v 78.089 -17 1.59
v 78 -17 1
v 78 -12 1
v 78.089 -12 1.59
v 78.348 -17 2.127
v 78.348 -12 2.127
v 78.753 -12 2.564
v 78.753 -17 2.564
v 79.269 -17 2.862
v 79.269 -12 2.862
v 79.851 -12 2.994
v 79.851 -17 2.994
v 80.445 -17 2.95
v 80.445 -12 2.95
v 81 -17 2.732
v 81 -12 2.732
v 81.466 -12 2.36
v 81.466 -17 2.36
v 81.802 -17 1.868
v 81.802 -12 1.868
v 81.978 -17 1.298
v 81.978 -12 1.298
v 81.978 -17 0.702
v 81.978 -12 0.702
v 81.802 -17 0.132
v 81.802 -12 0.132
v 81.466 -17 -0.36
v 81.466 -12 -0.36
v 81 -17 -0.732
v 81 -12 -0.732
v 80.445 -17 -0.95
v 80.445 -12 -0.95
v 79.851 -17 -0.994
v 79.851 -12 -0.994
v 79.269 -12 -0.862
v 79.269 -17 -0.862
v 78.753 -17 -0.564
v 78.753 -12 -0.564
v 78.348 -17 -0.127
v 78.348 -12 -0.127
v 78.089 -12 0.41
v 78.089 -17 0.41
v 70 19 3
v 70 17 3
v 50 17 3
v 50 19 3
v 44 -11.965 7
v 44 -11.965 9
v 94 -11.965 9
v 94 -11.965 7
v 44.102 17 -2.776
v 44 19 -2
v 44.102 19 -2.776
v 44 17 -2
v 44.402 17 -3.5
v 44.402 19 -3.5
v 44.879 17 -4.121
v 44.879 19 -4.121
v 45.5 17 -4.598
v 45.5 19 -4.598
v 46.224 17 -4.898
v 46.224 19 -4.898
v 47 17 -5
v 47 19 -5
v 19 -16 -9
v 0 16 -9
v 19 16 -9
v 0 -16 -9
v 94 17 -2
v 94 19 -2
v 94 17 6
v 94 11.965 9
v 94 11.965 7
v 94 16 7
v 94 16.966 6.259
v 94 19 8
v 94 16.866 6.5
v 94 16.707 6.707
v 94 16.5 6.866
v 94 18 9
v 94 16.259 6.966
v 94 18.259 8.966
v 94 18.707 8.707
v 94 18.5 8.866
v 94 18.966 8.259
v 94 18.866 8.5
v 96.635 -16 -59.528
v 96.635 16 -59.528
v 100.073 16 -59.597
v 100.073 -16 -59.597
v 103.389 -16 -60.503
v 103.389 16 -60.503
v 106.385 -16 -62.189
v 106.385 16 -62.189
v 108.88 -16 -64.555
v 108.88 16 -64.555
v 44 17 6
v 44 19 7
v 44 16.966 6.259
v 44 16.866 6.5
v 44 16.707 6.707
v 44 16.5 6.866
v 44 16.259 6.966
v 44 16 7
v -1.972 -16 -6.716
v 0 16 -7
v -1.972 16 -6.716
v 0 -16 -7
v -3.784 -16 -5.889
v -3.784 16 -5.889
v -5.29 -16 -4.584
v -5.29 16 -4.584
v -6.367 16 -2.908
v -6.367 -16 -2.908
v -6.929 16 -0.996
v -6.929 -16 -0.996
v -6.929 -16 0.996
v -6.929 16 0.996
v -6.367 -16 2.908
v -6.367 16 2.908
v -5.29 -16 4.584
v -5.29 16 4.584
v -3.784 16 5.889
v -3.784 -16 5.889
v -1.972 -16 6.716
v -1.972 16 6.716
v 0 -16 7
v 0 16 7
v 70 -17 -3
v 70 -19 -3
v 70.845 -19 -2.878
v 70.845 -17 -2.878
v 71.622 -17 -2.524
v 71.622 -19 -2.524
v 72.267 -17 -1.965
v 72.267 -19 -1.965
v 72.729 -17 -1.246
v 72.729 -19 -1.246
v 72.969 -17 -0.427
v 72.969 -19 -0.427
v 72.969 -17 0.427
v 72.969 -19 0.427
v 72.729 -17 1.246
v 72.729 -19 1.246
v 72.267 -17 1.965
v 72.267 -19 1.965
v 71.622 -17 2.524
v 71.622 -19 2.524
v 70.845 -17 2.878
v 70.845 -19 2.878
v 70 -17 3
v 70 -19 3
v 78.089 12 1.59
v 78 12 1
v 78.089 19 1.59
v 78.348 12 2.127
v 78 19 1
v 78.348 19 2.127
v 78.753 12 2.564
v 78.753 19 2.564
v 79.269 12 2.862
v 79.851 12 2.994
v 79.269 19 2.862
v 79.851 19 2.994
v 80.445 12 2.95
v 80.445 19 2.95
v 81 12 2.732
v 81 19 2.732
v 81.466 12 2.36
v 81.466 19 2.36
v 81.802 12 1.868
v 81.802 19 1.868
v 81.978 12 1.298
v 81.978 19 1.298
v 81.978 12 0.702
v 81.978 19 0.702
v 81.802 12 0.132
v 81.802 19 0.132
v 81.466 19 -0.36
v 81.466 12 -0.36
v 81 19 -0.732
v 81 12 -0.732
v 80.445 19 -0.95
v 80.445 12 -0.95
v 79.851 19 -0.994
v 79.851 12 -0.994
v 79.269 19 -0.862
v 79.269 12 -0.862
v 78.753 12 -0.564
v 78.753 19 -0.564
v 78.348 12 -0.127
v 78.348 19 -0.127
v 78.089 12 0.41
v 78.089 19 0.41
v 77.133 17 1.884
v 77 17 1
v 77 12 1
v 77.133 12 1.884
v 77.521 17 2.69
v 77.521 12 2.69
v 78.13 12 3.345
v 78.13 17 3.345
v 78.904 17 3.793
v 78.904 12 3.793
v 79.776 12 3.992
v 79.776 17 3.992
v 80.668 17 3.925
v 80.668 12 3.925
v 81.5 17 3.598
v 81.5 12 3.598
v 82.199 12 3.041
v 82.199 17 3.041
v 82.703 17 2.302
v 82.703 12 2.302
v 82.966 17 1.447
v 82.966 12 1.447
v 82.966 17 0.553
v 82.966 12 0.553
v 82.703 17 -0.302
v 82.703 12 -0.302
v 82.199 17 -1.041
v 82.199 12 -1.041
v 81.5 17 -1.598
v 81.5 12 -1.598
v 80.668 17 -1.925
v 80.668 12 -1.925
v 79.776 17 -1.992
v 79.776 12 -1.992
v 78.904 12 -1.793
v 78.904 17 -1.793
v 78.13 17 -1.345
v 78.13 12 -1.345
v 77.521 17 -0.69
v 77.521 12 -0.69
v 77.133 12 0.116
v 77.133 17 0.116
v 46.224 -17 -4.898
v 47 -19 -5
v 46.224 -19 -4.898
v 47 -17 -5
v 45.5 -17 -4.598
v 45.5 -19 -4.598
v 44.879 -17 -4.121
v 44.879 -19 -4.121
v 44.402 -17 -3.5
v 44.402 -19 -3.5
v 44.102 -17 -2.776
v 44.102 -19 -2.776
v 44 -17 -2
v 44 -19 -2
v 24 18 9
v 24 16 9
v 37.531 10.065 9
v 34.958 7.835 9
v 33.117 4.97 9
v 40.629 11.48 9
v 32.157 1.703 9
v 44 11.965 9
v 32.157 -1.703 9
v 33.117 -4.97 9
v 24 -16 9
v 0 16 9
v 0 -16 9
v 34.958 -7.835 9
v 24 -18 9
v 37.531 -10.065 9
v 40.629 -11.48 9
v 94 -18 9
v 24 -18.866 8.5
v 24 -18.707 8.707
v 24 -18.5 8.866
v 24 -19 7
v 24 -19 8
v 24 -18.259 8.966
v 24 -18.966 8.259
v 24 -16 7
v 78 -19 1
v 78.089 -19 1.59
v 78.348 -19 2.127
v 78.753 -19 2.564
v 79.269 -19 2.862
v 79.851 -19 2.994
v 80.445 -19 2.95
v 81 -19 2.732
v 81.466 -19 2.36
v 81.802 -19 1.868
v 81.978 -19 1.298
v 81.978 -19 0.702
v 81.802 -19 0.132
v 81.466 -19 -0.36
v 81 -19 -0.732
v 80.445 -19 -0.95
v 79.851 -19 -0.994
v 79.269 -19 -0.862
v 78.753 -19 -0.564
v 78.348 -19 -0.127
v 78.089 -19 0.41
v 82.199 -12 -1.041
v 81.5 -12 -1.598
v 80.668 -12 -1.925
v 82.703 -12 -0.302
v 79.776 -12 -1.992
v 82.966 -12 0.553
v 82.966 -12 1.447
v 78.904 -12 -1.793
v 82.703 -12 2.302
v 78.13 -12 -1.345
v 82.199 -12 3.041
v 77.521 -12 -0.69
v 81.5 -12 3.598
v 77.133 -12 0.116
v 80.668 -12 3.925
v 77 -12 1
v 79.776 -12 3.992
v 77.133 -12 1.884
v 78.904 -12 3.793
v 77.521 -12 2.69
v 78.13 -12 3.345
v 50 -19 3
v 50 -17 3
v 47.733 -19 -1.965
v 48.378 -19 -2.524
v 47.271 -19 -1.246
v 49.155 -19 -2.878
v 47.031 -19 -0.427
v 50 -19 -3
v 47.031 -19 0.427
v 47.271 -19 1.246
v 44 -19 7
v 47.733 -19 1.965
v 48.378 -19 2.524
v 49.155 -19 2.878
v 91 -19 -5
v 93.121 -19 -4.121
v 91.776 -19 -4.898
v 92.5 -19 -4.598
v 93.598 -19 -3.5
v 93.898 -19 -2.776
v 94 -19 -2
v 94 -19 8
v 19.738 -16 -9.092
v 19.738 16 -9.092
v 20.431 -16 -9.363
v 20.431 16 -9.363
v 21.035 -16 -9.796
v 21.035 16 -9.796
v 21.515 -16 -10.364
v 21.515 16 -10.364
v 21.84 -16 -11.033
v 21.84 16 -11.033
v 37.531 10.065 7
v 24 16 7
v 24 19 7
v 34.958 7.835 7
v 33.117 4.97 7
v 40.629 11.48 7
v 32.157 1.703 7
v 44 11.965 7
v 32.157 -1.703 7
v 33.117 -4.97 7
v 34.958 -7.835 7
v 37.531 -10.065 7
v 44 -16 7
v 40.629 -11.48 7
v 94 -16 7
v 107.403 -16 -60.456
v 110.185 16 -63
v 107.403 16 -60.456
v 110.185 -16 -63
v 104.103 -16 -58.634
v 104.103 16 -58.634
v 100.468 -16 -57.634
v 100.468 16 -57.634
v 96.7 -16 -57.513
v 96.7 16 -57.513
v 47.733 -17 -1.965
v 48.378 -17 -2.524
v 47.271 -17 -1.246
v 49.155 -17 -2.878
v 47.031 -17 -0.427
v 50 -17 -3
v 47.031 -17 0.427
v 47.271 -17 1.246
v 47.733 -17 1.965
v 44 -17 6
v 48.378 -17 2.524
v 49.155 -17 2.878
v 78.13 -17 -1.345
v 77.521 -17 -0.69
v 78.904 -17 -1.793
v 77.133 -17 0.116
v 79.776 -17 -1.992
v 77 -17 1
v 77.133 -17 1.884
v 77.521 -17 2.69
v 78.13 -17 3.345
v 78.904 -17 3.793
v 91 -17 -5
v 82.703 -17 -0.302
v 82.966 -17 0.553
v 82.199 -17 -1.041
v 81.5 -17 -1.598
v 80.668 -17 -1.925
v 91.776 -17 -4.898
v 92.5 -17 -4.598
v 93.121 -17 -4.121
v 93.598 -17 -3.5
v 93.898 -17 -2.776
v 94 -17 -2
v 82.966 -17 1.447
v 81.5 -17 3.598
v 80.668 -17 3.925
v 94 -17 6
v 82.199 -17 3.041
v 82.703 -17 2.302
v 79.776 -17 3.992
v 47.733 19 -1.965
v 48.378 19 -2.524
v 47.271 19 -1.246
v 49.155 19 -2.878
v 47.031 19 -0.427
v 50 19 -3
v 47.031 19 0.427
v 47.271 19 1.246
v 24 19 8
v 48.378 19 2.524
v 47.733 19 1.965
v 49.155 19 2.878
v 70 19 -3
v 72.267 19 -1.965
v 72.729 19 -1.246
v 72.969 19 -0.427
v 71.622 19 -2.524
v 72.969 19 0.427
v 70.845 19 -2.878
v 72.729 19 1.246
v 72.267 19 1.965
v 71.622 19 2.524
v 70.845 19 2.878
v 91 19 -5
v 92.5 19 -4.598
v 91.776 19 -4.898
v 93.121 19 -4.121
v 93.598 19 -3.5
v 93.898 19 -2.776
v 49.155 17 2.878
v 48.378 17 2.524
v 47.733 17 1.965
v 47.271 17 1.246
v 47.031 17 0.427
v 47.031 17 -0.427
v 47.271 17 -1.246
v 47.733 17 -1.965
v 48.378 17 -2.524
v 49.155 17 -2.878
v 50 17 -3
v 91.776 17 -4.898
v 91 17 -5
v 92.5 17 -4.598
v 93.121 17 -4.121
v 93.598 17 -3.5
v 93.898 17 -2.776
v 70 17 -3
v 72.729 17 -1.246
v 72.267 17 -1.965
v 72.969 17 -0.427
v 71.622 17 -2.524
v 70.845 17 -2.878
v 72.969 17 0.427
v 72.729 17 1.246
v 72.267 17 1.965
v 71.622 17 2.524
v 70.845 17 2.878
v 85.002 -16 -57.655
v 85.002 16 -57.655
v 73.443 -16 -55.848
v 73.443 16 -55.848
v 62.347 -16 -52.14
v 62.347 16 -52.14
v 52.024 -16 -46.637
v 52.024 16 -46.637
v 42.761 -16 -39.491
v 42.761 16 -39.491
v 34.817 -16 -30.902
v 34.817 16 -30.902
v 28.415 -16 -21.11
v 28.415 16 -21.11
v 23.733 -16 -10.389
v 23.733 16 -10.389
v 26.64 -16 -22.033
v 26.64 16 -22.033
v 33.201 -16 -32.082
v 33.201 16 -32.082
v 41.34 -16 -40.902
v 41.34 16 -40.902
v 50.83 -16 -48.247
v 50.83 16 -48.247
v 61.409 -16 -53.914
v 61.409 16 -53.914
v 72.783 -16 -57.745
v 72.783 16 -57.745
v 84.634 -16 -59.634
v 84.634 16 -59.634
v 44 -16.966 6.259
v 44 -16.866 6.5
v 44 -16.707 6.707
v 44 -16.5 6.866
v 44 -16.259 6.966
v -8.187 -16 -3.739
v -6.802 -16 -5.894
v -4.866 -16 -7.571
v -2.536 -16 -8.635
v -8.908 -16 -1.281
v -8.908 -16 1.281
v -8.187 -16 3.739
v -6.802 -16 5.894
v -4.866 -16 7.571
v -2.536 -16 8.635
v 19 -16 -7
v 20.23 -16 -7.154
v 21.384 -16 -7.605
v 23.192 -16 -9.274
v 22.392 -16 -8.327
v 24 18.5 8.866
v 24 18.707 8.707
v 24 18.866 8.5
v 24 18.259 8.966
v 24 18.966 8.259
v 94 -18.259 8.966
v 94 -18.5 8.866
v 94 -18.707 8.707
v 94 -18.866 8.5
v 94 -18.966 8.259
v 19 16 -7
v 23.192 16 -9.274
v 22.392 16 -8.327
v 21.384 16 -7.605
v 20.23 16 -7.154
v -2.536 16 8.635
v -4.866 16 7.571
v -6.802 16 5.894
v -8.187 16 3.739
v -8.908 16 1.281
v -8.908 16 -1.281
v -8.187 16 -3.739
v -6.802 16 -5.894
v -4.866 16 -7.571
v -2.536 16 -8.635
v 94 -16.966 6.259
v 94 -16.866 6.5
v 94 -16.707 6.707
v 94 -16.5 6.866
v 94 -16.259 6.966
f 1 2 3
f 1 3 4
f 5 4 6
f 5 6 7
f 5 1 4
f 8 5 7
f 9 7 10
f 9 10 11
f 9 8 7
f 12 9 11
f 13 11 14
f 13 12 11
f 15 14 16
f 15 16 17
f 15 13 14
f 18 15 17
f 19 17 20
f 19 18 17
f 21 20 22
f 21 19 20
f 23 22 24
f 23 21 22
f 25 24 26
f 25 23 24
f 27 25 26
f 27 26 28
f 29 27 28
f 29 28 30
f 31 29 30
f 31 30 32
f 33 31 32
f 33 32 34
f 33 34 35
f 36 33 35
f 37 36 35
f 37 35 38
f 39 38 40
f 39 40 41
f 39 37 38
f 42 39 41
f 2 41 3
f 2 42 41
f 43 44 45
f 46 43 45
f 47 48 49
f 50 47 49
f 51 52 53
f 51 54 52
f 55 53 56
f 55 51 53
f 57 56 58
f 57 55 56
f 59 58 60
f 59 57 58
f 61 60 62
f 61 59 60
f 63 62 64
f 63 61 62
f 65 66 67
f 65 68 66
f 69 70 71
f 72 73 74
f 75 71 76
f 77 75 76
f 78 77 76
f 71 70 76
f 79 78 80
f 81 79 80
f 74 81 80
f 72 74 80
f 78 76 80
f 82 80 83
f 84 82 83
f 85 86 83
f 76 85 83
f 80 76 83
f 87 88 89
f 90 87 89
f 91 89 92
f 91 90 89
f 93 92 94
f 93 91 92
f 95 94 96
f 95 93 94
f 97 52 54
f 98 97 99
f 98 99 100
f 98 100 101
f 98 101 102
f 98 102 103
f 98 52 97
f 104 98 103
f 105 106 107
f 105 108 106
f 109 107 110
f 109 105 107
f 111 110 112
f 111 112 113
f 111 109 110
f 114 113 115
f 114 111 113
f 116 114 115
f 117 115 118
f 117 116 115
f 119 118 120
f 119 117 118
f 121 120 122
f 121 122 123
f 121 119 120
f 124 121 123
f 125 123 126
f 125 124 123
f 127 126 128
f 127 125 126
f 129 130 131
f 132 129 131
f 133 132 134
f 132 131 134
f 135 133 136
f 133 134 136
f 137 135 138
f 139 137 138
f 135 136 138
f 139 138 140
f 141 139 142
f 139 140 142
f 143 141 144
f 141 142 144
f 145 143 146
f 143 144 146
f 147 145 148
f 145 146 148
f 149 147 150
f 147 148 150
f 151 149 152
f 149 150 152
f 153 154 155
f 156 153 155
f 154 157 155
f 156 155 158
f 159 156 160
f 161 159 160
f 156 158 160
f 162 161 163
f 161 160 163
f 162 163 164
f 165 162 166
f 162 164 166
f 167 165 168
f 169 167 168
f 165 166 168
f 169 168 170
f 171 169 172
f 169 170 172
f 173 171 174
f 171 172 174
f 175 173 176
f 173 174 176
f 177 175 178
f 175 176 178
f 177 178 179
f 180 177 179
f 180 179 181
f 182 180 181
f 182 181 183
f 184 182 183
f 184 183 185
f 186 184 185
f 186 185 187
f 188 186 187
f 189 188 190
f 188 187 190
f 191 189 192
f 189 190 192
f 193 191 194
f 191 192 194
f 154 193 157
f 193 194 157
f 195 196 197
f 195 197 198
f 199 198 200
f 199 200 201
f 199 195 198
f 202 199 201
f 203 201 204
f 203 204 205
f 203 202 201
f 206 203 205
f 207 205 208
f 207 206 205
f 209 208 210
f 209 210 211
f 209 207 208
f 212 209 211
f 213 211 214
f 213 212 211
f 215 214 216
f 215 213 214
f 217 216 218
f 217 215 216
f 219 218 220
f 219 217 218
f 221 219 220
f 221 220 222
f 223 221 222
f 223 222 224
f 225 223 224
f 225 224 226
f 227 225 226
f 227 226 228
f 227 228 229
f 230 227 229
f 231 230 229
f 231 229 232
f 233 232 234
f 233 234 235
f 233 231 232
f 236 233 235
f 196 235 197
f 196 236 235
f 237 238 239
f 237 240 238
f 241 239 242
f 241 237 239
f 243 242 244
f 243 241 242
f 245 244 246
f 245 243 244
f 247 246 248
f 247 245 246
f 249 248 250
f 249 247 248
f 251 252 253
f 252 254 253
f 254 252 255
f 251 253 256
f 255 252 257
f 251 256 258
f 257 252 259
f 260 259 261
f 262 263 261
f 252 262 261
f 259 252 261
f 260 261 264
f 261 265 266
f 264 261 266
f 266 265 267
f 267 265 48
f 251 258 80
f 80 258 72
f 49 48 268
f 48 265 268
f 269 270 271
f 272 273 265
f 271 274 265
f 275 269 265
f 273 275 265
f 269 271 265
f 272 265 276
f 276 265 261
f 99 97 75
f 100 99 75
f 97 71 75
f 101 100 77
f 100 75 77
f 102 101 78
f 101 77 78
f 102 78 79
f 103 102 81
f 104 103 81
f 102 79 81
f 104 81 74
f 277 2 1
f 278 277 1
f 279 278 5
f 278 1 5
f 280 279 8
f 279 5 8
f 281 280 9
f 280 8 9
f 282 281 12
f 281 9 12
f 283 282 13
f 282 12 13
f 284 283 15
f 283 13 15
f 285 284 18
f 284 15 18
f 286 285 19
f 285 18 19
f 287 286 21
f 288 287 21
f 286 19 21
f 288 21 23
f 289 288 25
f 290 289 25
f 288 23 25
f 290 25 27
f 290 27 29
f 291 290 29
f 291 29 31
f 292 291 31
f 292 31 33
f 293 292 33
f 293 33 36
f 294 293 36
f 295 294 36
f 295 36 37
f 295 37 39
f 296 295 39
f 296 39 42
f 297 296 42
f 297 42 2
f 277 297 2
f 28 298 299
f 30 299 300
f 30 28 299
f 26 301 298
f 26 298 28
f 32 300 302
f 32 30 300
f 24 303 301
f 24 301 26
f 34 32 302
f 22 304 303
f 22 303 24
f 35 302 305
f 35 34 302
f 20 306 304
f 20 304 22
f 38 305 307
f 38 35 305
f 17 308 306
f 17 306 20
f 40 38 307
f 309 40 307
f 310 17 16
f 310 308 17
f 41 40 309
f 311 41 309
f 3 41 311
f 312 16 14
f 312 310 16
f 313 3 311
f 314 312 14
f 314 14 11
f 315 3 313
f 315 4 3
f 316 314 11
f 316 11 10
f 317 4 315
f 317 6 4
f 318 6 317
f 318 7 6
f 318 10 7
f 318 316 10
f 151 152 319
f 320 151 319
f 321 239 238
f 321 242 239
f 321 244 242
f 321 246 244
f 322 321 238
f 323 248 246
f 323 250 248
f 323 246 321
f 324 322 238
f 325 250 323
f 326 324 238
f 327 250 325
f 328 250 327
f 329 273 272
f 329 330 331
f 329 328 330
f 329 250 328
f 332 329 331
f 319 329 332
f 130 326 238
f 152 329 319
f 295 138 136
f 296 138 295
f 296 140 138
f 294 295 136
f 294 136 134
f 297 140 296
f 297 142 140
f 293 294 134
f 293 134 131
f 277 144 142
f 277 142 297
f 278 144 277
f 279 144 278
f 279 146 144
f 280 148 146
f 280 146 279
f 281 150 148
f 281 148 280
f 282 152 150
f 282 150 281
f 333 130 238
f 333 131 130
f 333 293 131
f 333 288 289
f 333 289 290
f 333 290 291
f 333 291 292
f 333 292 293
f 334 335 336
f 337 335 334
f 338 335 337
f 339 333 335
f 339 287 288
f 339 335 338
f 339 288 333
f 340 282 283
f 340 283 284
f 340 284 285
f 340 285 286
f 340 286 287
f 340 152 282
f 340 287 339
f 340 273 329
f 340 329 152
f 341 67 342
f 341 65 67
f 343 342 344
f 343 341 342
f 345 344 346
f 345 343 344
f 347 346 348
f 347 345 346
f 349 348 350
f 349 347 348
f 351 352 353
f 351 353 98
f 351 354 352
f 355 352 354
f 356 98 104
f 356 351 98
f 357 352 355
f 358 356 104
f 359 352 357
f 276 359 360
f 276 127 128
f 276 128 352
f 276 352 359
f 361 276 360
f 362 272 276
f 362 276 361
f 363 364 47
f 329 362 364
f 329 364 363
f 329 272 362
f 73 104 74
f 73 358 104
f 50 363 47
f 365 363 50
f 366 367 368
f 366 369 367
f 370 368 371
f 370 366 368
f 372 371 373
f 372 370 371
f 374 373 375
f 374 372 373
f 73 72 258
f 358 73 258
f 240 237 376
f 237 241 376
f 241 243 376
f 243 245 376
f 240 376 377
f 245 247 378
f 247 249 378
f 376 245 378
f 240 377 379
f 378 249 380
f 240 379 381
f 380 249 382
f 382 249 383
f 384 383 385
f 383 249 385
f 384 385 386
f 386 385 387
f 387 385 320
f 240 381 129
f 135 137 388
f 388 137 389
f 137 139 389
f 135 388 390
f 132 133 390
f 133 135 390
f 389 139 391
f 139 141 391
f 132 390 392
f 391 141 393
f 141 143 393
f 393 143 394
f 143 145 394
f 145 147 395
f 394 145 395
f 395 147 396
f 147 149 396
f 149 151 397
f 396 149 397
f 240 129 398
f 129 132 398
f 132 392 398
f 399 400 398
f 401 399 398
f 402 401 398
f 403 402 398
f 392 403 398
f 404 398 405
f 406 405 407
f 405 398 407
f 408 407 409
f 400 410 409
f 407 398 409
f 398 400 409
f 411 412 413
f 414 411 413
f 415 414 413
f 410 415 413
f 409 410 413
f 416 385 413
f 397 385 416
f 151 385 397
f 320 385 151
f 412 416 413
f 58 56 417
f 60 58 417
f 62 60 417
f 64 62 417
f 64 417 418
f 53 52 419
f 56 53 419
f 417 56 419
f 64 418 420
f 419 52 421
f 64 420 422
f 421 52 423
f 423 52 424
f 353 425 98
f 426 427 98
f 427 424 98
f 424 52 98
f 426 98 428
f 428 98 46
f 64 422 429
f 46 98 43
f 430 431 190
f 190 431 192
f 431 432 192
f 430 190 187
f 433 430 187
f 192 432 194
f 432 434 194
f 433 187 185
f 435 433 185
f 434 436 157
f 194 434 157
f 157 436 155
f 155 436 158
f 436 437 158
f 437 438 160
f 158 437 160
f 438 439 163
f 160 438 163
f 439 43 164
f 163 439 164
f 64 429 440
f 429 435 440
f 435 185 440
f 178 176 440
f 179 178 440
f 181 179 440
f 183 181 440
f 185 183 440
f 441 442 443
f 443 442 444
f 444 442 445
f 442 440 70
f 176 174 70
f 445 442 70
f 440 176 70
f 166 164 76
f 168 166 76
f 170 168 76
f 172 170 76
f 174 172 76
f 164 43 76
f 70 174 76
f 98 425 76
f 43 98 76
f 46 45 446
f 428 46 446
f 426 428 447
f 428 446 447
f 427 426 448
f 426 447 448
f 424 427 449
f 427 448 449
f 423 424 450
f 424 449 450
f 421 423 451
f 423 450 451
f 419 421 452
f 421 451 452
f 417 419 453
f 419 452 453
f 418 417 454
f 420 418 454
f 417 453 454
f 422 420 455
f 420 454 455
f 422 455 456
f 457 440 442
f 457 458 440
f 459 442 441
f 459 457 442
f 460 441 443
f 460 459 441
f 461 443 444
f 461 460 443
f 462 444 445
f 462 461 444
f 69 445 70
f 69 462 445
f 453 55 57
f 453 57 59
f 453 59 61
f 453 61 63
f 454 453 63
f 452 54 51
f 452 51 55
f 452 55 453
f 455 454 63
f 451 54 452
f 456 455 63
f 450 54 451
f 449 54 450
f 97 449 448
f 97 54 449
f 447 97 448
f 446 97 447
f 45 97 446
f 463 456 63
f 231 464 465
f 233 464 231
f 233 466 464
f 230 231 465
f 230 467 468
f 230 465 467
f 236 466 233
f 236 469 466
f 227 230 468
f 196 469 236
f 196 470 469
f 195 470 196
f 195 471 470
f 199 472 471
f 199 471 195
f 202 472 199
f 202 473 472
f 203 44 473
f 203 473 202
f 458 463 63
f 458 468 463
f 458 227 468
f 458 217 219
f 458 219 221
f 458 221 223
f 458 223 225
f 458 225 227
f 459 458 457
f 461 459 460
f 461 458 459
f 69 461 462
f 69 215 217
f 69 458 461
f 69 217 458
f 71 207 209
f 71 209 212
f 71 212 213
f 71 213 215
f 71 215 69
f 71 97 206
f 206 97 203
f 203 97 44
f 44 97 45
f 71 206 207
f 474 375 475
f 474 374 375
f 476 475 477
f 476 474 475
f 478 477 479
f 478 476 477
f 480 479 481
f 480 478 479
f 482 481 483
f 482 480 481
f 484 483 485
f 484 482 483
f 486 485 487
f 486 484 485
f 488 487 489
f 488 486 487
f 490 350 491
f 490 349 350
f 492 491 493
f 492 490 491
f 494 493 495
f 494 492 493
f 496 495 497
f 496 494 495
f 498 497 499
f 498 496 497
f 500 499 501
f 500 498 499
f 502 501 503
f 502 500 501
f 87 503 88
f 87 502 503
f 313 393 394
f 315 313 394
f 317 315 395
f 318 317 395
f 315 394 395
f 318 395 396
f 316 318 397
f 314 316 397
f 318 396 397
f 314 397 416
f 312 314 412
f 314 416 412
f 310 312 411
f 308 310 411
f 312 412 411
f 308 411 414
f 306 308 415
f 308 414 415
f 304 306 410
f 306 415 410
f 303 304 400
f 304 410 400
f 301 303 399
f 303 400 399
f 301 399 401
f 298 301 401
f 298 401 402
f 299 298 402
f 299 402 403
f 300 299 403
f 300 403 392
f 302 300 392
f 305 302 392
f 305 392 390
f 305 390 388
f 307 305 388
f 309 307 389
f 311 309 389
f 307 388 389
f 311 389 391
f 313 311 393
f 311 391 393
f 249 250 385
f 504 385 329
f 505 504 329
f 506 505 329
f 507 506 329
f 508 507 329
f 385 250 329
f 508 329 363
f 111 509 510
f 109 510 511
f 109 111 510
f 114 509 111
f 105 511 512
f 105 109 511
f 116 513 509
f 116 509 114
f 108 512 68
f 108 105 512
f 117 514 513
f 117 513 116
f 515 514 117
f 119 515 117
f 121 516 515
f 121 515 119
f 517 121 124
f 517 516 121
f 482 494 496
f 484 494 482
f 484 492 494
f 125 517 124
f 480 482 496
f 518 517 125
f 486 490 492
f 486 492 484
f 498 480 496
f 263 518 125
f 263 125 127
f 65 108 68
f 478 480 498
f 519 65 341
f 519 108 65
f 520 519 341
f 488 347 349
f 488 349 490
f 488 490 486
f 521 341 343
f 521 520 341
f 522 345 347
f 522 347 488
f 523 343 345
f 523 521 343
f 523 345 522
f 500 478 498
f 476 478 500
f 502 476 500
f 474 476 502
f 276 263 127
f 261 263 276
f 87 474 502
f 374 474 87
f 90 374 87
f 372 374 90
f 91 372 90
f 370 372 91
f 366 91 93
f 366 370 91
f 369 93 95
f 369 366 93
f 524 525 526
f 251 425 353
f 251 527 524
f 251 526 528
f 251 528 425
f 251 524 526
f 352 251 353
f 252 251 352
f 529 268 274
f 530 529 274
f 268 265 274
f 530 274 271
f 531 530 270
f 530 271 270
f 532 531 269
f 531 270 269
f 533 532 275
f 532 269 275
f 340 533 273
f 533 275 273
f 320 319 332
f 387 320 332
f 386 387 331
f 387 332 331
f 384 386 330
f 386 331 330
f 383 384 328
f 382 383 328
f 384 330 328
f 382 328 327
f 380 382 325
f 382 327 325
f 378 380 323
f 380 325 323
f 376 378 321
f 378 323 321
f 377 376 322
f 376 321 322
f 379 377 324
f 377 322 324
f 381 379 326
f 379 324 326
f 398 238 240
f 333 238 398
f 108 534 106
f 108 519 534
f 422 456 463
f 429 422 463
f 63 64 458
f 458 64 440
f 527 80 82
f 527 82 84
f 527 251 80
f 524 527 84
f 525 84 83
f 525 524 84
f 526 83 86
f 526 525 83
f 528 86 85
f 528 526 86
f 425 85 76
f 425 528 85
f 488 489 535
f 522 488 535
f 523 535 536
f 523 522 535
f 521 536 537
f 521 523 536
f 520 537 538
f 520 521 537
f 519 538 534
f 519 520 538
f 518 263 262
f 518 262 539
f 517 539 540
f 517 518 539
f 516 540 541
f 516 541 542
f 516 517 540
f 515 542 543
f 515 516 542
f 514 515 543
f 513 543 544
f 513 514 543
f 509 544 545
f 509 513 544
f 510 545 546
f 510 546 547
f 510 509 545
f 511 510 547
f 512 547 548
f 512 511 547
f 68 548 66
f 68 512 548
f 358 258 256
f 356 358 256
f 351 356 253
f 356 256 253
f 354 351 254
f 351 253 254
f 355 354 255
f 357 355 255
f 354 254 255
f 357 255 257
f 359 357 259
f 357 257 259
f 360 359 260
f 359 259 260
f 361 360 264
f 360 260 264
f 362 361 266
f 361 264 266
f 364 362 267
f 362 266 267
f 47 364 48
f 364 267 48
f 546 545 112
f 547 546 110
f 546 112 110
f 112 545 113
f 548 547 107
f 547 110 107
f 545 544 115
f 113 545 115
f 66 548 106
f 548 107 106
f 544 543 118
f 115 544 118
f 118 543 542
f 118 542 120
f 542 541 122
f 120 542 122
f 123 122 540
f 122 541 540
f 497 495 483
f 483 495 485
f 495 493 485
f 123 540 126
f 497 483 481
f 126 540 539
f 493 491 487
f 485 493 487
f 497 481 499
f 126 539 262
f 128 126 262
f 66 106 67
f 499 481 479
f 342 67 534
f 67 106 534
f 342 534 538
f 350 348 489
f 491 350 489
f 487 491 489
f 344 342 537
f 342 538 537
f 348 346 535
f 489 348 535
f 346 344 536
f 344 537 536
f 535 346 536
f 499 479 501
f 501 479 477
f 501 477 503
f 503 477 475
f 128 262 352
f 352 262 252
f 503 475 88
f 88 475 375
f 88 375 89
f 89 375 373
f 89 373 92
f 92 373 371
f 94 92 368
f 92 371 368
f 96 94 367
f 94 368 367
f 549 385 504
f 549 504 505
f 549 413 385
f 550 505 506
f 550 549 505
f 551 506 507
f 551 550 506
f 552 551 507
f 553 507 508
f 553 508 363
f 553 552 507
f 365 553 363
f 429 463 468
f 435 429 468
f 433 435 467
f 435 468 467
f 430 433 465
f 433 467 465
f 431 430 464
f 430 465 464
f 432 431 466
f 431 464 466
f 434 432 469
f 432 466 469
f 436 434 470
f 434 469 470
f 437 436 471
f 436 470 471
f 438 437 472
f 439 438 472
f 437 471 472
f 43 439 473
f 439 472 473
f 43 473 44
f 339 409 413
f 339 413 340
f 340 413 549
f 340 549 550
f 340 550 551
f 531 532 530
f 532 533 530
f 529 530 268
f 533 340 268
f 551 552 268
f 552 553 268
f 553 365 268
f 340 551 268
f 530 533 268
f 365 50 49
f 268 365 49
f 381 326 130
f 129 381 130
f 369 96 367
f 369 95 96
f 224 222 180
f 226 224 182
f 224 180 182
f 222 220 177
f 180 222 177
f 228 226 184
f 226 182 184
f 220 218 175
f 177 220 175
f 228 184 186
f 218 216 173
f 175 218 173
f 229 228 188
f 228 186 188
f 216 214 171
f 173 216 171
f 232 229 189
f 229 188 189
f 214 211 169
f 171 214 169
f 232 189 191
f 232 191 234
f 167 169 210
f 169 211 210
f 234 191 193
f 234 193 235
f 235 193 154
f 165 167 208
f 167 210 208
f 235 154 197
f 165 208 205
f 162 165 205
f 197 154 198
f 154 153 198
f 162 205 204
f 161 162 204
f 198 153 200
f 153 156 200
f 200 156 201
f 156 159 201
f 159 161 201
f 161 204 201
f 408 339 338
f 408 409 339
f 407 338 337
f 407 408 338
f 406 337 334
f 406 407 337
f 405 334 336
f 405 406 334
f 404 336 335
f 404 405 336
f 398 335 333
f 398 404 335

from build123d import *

# Parameters (mm, degrees)
F1_DEPTH  = 16
F2_W      = 70
F2_H      = 3
F3_DEPTH  = 2
F4_W      = 50
F4_H      = 14
F5_DEPTH  = 2
F6_R      = 1
F9_DEPTH  = 2
F11_DEPTH = 38.001
F13_D     = 4
F14_R     = 3
F14_R_2   = 2
F15_DEPTH = 5
F16_R     = 3


# Not quite as in the source:
# - a pattern or mirror of a feature is missing from the dataset's text; its kind, count and spacing are read off the source's solid


with BuildPart() as f1:
    # F0 (on Front) → F1 (new body)
    with BuildSketch(Plane.XZ):
        with BuildLine():
            Line((94, 9), (0, 9))
            ThreePointArc((0, 9), (-9, 0), (0, -9))
            Line((0, -9), (19, -9))
            ThreePointArc((19, -9), (20.7464347921, -9.5607448848), (21.84, -11.0333563221))
            ThreePointArc((21.84, -11.0333563221), (50.8304964021, -48.2470687705), (96.6350861079, -59.5275314258))
            ThreePointArc((96.6350861079, -59.5275314258), (103.3892729035, -60.5026852737), (108.8800565509, -64.5550005668))
            Line((108.8800565509, -64.5550005668), (110.184856953, -63))
            ThreePointArc((110.184856953, -63), (104.1026052212, -58.6336361635), (96.6997621323, -57.5125503141))
            ThreePointArc((96.6997621323, -57.5125503141), (52.0235205329, -46.636858721), (23.7333333333, -10.3889272035))
            ThreePointArc((23.7333333333, -10.3889272035), (21.9107246536, -7.9345748081), (19, -7))
            Line((19, -7), (0, -7))
            ThreePointArc((0, -7), (-7, 0), (0, 7))
            Line((0, 7), (94, 7))
            Line((94, 7), (94, 9))
        make_face()
    extrude(amount=F1_DEPTH)

    # F2 (on face) → F3 (join)
    with BuildSketch(Plane.XY.offset(9)):
        with Locations((59, -17.5)):
            Rectangle(F2_W, F2_H)
    extrude(amount=-F3_DEPTH)

    # F4 (on face) → F5 (join)
    with BuildSketch(Plane.XZ.offset(19)):
        with Locations((69, 2)):
            Rectangle(F4_W, F4_H)
    extrude(amount=-F5_DEPTH)

    # F6
    f6_edges = [f1.edges().sort_by_distance(p)[0] for p in [
        (59, -19, 9),
        (69, -17, 7),
    ]]
    fillet(f6_edges, radius=F6_R)

    # F7: F1 across plane


with BuildPart() as f1_1:
    add(f1.part)
    add(f1.part.mirror(Plane.XZ))

    # F8 (on face) → F9 (cut)
    with BuildSketch(Plane.XY.offset(9)):
        with BuildLine():
            Line((94, 11.9645609066), (44, 11.9645609066))
            ThreePointArc((44, 11.9645609066), (32.0354390934, 0), (44, -11.9645609066))
            Line((44, -11.9645609066), (94, -11.9645609066))
            Line((94, -11.9645609066), (94, 11.9645609066))
        make_face()
    extrude(amount=-F9_DEPTH, mode=Mode.SUBTRACT)

    # F10 (on face) → F11 (cut, through all)
    with BuildSketch(Plane.XZ.offset(19)):
        with BuildLine():
            ThreePointArc((50, 3), (47, 0), (50, -3))
            Line((50, -3), (70, -3))
            ThreePointArc((70, -3), (73, 0), (70, 3))
            Line((70, 3), (50, 3))
        make_face()
    extrude(amount=-F11_DEPTH, mode=Mode.SUBTRACT)

    # F13 (through all)
    with Locations(Plane.XZ.offset(19)):
        with Locations((80, 1)):
            Hole(F13_D / 2)

    # F14 (on face) → F15 (join)
    with BuildSketch(Plane(origin=(0, -17, 0), x_dir=(-1, 0, 0), z_dir=(0, 1, 0))):
        with Locations((-80, 1)):
            Circle(F14_R)
        with Locations((-80, 1)):
            Circle(F14_R_2, mode=Mode.SUBTRACT)
    f15 = extrude(amount=F15_DEPTH)

    # F15_copies: F15 across plane
    add(f15.mirror(Plane.ZX))

    # F16
    f16_edges = [f1_1.edges().sort_by_distance(p)[0] for p in [
        (94, 18, -5),
        (94, -18, -5),
        (44, -18, -5),
        (44, 18, -5),
    ]]
    fillet(f16_edges, radius=F16_R)


solid = f1_1.part
